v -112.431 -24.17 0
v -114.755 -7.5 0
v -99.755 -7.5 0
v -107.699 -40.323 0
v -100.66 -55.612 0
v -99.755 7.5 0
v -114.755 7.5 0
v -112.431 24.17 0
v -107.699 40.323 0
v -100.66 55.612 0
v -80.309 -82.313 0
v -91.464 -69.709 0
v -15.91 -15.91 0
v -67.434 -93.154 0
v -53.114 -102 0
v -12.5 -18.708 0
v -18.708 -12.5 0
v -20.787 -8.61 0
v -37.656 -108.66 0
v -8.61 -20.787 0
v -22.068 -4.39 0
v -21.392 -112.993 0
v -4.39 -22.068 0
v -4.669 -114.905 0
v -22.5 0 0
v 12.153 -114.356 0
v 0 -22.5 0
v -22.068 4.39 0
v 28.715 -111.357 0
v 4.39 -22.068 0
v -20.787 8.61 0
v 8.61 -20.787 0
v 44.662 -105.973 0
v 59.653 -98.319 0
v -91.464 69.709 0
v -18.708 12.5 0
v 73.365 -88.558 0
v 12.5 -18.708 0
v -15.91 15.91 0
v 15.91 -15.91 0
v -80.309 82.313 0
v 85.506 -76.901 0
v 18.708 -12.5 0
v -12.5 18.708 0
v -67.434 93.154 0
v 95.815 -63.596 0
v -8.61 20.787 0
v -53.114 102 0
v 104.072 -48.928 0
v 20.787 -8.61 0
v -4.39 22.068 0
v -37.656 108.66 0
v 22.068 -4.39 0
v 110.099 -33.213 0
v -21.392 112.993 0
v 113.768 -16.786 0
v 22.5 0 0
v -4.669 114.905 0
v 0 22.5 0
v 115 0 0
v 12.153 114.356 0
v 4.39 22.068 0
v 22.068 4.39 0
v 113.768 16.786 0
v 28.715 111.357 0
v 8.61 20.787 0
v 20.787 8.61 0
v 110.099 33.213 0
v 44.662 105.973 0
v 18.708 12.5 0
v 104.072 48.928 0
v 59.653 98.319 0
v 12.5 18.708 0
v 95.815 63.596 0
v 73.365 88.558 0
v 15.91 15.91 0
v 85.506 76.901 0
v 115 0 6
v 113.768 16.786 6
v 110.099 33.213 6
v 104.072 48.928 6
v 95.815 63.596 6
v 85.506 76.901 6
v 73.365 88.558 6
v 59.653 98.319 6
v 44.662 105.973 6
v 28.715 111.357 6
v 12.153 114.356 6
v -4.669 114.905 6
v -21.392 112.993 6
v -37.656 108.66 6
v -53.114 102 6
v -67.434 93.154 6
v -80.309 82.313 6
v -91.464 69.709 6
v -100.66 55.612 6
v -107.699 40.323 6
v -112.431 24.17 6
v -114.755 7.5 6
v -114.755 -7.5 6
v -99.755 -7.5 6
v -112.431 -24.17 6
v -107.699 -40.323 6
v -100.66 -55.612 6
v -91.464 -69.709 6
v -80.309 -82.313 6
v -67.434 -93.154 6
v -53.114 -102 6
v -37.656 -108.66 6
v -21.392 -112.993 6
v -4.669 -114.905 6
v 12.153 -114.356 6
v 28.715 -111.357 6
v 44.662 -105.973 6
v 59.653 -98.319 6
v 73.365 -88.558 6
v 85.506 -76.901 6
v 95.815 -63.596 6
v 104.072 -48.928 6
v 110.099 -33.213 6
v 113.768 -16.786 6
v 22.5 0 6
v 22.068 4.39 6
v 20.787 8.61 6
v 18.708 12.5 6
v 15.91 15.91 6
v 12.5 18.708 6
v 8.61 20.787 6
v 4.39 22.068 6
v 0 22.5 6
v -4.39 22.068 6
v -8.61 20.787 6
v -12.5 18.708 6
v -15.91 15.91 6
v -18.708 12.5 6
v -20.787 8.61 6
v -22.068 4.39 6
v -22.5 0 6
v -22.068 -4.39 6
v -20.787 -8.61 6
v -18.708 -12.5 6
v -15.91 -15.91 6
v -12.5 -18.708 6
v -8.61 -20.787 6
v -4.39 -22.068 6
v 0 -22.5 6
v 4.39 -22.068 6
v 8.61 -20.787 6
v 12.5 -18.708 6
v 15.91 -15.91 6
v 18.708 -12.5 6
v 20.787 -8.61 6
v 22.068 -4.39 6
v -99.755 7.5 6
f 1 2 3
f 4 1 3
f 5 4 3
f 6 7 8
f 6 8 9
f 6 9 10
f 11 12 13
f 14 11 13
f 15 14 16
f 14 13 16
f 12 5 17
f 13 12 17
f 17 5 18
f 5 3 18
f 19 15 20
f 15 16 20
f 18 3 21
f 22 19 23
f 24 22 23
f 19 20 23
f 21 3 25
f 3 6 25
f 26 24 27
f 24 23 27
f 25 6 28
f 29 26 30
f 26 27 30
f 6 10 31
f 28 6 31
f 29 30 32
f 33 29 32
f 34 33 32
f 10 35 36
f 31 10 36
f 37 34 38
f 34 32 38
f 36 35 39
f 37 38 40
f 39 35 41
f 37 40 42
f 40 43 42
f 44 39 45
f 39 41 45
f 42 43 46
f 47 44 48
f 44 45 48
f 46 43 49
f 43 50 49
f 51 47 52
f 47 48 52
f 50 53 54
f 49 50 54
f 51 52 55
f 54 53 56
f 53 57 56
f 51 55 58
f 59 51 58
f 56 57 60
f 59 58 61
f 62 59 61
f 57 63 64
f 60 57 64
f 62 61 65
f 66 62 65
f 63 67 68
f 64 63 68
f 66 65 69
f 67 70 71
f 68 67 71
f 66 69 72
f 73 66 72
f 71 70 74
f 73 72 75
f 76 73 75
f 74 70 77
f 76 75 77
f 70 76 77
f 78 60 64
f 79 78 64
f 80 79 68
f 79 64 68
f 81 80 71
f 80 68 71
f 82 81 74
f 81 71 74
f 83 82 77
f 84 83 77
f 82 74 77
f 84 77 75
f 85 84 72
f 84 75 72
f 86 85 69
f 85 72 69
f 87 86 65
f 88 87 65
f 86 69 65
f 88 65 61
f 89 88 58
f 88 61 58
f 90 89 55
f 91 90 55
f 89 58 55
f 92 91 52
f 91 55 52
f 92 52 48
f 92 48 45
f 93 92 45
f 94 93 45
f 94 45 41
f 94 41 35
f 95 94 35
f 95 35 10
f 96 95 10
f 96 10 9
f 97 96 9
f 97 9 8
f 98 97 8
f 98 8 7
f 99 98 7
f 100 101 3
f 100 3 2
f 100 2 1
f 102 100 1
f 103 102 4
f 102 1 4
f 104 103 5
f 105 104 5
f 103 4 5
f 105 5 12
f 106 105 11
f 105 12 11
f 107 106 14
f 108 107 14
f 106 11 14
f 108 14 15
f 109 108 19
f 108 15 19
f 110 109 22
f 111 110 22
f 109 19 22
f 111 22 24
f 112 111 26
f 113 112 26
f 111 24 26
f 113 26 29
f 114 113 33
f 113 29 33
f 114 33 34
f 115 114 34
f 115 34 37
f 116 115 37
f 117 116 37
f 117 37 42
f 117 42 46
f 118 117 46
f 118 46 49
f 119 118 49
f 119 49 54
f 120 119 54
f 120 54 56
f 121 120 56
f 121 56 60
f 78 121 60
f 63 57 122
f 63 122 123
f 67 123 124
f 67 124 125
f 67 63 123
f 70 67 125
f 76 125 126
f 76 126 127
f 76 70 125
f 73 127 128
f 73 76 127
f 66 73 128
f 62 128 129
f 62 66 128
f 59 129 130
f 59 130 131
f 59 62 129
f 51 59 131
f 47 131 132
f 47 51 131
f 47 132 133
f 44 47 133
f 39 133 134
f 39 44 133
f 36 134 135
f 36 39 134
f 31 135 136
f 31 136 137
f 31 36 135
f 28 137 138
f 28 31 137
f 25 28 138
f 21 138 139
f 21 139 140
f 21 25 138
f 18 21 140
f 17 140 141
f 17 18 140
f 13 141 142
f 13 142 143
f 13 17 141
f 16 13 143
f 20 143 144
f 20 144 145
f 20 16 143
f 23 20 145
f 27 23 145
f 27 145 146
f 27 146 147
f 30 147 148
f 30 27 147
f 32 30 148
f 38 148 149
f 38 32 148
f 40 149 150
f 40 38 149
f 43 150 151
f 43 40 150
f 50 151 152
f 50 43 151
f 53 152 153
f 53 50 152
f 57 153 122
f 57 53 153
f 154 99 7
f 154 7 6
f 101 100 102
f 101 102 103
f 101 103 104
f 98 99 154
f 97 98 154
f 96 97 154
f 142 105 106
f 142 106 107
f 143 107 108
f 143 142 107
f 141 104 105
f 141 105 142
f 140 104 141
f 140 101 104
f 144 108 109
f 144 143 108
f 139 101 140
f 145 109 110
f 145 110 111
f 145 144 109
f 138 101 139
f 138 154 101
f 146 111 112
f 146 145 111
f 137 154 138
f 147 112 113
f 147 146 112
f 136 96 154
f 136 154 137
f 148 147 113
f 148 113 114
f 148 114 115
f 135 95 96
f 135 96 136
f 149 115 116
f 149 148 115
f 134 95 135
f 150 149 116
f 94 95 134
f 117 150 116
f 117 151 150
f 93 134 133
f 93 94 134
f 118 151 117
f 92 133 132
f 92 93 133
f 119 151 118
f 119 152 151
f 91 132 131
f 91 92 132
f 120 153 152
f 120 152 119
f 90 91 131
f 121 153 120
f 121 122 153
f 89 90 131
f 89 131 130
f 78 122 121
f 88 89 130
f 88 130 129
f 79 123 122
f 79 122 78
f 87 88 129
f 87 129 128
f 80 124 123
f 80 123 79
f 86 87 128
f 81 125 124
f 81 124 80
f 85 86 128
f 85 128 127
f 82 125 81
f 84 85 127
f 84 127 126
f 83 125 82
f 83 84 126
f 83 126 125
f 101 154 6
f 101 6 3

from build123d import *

# Parameters (mm, degrees)
ESQUISSE1_R             = 115
ESQUISSE1_R_2           = 22.5
BOSS_EXTRU_1_DEPTH      = 6
ENL_V_MAT_EXTRU_2_DEPTH = 6


with BuildPart() as part:
    # Esquisse1 → Boss.-Extru.1 (new body)
    with BuildSketch(Plane.XY):
        Circle(ESQUISSE1_R)
        Circle(ESQUISSE1_R_2, mode=Mode.SUBTRACT)
    extrude(amount=BOSS_EXTRU_1_DEPTH)

    # Esquisse2 → Enlèv. mat.-Extru.2 (cut)
    with BuildSketch(Plane.XY.offset(6)):
        Polygon((-114.755174175, 7.5), (-99.755174175, 7.5), (-99.755174175, -7.5), (-114.755174175, -7.5), (-126.610711634, 0), align=None)
    extrude(amount=-ENL_V_MAT_EXTRU_2_DEPTH, mode=Mode.SUBTRACT)


solid = part.part
